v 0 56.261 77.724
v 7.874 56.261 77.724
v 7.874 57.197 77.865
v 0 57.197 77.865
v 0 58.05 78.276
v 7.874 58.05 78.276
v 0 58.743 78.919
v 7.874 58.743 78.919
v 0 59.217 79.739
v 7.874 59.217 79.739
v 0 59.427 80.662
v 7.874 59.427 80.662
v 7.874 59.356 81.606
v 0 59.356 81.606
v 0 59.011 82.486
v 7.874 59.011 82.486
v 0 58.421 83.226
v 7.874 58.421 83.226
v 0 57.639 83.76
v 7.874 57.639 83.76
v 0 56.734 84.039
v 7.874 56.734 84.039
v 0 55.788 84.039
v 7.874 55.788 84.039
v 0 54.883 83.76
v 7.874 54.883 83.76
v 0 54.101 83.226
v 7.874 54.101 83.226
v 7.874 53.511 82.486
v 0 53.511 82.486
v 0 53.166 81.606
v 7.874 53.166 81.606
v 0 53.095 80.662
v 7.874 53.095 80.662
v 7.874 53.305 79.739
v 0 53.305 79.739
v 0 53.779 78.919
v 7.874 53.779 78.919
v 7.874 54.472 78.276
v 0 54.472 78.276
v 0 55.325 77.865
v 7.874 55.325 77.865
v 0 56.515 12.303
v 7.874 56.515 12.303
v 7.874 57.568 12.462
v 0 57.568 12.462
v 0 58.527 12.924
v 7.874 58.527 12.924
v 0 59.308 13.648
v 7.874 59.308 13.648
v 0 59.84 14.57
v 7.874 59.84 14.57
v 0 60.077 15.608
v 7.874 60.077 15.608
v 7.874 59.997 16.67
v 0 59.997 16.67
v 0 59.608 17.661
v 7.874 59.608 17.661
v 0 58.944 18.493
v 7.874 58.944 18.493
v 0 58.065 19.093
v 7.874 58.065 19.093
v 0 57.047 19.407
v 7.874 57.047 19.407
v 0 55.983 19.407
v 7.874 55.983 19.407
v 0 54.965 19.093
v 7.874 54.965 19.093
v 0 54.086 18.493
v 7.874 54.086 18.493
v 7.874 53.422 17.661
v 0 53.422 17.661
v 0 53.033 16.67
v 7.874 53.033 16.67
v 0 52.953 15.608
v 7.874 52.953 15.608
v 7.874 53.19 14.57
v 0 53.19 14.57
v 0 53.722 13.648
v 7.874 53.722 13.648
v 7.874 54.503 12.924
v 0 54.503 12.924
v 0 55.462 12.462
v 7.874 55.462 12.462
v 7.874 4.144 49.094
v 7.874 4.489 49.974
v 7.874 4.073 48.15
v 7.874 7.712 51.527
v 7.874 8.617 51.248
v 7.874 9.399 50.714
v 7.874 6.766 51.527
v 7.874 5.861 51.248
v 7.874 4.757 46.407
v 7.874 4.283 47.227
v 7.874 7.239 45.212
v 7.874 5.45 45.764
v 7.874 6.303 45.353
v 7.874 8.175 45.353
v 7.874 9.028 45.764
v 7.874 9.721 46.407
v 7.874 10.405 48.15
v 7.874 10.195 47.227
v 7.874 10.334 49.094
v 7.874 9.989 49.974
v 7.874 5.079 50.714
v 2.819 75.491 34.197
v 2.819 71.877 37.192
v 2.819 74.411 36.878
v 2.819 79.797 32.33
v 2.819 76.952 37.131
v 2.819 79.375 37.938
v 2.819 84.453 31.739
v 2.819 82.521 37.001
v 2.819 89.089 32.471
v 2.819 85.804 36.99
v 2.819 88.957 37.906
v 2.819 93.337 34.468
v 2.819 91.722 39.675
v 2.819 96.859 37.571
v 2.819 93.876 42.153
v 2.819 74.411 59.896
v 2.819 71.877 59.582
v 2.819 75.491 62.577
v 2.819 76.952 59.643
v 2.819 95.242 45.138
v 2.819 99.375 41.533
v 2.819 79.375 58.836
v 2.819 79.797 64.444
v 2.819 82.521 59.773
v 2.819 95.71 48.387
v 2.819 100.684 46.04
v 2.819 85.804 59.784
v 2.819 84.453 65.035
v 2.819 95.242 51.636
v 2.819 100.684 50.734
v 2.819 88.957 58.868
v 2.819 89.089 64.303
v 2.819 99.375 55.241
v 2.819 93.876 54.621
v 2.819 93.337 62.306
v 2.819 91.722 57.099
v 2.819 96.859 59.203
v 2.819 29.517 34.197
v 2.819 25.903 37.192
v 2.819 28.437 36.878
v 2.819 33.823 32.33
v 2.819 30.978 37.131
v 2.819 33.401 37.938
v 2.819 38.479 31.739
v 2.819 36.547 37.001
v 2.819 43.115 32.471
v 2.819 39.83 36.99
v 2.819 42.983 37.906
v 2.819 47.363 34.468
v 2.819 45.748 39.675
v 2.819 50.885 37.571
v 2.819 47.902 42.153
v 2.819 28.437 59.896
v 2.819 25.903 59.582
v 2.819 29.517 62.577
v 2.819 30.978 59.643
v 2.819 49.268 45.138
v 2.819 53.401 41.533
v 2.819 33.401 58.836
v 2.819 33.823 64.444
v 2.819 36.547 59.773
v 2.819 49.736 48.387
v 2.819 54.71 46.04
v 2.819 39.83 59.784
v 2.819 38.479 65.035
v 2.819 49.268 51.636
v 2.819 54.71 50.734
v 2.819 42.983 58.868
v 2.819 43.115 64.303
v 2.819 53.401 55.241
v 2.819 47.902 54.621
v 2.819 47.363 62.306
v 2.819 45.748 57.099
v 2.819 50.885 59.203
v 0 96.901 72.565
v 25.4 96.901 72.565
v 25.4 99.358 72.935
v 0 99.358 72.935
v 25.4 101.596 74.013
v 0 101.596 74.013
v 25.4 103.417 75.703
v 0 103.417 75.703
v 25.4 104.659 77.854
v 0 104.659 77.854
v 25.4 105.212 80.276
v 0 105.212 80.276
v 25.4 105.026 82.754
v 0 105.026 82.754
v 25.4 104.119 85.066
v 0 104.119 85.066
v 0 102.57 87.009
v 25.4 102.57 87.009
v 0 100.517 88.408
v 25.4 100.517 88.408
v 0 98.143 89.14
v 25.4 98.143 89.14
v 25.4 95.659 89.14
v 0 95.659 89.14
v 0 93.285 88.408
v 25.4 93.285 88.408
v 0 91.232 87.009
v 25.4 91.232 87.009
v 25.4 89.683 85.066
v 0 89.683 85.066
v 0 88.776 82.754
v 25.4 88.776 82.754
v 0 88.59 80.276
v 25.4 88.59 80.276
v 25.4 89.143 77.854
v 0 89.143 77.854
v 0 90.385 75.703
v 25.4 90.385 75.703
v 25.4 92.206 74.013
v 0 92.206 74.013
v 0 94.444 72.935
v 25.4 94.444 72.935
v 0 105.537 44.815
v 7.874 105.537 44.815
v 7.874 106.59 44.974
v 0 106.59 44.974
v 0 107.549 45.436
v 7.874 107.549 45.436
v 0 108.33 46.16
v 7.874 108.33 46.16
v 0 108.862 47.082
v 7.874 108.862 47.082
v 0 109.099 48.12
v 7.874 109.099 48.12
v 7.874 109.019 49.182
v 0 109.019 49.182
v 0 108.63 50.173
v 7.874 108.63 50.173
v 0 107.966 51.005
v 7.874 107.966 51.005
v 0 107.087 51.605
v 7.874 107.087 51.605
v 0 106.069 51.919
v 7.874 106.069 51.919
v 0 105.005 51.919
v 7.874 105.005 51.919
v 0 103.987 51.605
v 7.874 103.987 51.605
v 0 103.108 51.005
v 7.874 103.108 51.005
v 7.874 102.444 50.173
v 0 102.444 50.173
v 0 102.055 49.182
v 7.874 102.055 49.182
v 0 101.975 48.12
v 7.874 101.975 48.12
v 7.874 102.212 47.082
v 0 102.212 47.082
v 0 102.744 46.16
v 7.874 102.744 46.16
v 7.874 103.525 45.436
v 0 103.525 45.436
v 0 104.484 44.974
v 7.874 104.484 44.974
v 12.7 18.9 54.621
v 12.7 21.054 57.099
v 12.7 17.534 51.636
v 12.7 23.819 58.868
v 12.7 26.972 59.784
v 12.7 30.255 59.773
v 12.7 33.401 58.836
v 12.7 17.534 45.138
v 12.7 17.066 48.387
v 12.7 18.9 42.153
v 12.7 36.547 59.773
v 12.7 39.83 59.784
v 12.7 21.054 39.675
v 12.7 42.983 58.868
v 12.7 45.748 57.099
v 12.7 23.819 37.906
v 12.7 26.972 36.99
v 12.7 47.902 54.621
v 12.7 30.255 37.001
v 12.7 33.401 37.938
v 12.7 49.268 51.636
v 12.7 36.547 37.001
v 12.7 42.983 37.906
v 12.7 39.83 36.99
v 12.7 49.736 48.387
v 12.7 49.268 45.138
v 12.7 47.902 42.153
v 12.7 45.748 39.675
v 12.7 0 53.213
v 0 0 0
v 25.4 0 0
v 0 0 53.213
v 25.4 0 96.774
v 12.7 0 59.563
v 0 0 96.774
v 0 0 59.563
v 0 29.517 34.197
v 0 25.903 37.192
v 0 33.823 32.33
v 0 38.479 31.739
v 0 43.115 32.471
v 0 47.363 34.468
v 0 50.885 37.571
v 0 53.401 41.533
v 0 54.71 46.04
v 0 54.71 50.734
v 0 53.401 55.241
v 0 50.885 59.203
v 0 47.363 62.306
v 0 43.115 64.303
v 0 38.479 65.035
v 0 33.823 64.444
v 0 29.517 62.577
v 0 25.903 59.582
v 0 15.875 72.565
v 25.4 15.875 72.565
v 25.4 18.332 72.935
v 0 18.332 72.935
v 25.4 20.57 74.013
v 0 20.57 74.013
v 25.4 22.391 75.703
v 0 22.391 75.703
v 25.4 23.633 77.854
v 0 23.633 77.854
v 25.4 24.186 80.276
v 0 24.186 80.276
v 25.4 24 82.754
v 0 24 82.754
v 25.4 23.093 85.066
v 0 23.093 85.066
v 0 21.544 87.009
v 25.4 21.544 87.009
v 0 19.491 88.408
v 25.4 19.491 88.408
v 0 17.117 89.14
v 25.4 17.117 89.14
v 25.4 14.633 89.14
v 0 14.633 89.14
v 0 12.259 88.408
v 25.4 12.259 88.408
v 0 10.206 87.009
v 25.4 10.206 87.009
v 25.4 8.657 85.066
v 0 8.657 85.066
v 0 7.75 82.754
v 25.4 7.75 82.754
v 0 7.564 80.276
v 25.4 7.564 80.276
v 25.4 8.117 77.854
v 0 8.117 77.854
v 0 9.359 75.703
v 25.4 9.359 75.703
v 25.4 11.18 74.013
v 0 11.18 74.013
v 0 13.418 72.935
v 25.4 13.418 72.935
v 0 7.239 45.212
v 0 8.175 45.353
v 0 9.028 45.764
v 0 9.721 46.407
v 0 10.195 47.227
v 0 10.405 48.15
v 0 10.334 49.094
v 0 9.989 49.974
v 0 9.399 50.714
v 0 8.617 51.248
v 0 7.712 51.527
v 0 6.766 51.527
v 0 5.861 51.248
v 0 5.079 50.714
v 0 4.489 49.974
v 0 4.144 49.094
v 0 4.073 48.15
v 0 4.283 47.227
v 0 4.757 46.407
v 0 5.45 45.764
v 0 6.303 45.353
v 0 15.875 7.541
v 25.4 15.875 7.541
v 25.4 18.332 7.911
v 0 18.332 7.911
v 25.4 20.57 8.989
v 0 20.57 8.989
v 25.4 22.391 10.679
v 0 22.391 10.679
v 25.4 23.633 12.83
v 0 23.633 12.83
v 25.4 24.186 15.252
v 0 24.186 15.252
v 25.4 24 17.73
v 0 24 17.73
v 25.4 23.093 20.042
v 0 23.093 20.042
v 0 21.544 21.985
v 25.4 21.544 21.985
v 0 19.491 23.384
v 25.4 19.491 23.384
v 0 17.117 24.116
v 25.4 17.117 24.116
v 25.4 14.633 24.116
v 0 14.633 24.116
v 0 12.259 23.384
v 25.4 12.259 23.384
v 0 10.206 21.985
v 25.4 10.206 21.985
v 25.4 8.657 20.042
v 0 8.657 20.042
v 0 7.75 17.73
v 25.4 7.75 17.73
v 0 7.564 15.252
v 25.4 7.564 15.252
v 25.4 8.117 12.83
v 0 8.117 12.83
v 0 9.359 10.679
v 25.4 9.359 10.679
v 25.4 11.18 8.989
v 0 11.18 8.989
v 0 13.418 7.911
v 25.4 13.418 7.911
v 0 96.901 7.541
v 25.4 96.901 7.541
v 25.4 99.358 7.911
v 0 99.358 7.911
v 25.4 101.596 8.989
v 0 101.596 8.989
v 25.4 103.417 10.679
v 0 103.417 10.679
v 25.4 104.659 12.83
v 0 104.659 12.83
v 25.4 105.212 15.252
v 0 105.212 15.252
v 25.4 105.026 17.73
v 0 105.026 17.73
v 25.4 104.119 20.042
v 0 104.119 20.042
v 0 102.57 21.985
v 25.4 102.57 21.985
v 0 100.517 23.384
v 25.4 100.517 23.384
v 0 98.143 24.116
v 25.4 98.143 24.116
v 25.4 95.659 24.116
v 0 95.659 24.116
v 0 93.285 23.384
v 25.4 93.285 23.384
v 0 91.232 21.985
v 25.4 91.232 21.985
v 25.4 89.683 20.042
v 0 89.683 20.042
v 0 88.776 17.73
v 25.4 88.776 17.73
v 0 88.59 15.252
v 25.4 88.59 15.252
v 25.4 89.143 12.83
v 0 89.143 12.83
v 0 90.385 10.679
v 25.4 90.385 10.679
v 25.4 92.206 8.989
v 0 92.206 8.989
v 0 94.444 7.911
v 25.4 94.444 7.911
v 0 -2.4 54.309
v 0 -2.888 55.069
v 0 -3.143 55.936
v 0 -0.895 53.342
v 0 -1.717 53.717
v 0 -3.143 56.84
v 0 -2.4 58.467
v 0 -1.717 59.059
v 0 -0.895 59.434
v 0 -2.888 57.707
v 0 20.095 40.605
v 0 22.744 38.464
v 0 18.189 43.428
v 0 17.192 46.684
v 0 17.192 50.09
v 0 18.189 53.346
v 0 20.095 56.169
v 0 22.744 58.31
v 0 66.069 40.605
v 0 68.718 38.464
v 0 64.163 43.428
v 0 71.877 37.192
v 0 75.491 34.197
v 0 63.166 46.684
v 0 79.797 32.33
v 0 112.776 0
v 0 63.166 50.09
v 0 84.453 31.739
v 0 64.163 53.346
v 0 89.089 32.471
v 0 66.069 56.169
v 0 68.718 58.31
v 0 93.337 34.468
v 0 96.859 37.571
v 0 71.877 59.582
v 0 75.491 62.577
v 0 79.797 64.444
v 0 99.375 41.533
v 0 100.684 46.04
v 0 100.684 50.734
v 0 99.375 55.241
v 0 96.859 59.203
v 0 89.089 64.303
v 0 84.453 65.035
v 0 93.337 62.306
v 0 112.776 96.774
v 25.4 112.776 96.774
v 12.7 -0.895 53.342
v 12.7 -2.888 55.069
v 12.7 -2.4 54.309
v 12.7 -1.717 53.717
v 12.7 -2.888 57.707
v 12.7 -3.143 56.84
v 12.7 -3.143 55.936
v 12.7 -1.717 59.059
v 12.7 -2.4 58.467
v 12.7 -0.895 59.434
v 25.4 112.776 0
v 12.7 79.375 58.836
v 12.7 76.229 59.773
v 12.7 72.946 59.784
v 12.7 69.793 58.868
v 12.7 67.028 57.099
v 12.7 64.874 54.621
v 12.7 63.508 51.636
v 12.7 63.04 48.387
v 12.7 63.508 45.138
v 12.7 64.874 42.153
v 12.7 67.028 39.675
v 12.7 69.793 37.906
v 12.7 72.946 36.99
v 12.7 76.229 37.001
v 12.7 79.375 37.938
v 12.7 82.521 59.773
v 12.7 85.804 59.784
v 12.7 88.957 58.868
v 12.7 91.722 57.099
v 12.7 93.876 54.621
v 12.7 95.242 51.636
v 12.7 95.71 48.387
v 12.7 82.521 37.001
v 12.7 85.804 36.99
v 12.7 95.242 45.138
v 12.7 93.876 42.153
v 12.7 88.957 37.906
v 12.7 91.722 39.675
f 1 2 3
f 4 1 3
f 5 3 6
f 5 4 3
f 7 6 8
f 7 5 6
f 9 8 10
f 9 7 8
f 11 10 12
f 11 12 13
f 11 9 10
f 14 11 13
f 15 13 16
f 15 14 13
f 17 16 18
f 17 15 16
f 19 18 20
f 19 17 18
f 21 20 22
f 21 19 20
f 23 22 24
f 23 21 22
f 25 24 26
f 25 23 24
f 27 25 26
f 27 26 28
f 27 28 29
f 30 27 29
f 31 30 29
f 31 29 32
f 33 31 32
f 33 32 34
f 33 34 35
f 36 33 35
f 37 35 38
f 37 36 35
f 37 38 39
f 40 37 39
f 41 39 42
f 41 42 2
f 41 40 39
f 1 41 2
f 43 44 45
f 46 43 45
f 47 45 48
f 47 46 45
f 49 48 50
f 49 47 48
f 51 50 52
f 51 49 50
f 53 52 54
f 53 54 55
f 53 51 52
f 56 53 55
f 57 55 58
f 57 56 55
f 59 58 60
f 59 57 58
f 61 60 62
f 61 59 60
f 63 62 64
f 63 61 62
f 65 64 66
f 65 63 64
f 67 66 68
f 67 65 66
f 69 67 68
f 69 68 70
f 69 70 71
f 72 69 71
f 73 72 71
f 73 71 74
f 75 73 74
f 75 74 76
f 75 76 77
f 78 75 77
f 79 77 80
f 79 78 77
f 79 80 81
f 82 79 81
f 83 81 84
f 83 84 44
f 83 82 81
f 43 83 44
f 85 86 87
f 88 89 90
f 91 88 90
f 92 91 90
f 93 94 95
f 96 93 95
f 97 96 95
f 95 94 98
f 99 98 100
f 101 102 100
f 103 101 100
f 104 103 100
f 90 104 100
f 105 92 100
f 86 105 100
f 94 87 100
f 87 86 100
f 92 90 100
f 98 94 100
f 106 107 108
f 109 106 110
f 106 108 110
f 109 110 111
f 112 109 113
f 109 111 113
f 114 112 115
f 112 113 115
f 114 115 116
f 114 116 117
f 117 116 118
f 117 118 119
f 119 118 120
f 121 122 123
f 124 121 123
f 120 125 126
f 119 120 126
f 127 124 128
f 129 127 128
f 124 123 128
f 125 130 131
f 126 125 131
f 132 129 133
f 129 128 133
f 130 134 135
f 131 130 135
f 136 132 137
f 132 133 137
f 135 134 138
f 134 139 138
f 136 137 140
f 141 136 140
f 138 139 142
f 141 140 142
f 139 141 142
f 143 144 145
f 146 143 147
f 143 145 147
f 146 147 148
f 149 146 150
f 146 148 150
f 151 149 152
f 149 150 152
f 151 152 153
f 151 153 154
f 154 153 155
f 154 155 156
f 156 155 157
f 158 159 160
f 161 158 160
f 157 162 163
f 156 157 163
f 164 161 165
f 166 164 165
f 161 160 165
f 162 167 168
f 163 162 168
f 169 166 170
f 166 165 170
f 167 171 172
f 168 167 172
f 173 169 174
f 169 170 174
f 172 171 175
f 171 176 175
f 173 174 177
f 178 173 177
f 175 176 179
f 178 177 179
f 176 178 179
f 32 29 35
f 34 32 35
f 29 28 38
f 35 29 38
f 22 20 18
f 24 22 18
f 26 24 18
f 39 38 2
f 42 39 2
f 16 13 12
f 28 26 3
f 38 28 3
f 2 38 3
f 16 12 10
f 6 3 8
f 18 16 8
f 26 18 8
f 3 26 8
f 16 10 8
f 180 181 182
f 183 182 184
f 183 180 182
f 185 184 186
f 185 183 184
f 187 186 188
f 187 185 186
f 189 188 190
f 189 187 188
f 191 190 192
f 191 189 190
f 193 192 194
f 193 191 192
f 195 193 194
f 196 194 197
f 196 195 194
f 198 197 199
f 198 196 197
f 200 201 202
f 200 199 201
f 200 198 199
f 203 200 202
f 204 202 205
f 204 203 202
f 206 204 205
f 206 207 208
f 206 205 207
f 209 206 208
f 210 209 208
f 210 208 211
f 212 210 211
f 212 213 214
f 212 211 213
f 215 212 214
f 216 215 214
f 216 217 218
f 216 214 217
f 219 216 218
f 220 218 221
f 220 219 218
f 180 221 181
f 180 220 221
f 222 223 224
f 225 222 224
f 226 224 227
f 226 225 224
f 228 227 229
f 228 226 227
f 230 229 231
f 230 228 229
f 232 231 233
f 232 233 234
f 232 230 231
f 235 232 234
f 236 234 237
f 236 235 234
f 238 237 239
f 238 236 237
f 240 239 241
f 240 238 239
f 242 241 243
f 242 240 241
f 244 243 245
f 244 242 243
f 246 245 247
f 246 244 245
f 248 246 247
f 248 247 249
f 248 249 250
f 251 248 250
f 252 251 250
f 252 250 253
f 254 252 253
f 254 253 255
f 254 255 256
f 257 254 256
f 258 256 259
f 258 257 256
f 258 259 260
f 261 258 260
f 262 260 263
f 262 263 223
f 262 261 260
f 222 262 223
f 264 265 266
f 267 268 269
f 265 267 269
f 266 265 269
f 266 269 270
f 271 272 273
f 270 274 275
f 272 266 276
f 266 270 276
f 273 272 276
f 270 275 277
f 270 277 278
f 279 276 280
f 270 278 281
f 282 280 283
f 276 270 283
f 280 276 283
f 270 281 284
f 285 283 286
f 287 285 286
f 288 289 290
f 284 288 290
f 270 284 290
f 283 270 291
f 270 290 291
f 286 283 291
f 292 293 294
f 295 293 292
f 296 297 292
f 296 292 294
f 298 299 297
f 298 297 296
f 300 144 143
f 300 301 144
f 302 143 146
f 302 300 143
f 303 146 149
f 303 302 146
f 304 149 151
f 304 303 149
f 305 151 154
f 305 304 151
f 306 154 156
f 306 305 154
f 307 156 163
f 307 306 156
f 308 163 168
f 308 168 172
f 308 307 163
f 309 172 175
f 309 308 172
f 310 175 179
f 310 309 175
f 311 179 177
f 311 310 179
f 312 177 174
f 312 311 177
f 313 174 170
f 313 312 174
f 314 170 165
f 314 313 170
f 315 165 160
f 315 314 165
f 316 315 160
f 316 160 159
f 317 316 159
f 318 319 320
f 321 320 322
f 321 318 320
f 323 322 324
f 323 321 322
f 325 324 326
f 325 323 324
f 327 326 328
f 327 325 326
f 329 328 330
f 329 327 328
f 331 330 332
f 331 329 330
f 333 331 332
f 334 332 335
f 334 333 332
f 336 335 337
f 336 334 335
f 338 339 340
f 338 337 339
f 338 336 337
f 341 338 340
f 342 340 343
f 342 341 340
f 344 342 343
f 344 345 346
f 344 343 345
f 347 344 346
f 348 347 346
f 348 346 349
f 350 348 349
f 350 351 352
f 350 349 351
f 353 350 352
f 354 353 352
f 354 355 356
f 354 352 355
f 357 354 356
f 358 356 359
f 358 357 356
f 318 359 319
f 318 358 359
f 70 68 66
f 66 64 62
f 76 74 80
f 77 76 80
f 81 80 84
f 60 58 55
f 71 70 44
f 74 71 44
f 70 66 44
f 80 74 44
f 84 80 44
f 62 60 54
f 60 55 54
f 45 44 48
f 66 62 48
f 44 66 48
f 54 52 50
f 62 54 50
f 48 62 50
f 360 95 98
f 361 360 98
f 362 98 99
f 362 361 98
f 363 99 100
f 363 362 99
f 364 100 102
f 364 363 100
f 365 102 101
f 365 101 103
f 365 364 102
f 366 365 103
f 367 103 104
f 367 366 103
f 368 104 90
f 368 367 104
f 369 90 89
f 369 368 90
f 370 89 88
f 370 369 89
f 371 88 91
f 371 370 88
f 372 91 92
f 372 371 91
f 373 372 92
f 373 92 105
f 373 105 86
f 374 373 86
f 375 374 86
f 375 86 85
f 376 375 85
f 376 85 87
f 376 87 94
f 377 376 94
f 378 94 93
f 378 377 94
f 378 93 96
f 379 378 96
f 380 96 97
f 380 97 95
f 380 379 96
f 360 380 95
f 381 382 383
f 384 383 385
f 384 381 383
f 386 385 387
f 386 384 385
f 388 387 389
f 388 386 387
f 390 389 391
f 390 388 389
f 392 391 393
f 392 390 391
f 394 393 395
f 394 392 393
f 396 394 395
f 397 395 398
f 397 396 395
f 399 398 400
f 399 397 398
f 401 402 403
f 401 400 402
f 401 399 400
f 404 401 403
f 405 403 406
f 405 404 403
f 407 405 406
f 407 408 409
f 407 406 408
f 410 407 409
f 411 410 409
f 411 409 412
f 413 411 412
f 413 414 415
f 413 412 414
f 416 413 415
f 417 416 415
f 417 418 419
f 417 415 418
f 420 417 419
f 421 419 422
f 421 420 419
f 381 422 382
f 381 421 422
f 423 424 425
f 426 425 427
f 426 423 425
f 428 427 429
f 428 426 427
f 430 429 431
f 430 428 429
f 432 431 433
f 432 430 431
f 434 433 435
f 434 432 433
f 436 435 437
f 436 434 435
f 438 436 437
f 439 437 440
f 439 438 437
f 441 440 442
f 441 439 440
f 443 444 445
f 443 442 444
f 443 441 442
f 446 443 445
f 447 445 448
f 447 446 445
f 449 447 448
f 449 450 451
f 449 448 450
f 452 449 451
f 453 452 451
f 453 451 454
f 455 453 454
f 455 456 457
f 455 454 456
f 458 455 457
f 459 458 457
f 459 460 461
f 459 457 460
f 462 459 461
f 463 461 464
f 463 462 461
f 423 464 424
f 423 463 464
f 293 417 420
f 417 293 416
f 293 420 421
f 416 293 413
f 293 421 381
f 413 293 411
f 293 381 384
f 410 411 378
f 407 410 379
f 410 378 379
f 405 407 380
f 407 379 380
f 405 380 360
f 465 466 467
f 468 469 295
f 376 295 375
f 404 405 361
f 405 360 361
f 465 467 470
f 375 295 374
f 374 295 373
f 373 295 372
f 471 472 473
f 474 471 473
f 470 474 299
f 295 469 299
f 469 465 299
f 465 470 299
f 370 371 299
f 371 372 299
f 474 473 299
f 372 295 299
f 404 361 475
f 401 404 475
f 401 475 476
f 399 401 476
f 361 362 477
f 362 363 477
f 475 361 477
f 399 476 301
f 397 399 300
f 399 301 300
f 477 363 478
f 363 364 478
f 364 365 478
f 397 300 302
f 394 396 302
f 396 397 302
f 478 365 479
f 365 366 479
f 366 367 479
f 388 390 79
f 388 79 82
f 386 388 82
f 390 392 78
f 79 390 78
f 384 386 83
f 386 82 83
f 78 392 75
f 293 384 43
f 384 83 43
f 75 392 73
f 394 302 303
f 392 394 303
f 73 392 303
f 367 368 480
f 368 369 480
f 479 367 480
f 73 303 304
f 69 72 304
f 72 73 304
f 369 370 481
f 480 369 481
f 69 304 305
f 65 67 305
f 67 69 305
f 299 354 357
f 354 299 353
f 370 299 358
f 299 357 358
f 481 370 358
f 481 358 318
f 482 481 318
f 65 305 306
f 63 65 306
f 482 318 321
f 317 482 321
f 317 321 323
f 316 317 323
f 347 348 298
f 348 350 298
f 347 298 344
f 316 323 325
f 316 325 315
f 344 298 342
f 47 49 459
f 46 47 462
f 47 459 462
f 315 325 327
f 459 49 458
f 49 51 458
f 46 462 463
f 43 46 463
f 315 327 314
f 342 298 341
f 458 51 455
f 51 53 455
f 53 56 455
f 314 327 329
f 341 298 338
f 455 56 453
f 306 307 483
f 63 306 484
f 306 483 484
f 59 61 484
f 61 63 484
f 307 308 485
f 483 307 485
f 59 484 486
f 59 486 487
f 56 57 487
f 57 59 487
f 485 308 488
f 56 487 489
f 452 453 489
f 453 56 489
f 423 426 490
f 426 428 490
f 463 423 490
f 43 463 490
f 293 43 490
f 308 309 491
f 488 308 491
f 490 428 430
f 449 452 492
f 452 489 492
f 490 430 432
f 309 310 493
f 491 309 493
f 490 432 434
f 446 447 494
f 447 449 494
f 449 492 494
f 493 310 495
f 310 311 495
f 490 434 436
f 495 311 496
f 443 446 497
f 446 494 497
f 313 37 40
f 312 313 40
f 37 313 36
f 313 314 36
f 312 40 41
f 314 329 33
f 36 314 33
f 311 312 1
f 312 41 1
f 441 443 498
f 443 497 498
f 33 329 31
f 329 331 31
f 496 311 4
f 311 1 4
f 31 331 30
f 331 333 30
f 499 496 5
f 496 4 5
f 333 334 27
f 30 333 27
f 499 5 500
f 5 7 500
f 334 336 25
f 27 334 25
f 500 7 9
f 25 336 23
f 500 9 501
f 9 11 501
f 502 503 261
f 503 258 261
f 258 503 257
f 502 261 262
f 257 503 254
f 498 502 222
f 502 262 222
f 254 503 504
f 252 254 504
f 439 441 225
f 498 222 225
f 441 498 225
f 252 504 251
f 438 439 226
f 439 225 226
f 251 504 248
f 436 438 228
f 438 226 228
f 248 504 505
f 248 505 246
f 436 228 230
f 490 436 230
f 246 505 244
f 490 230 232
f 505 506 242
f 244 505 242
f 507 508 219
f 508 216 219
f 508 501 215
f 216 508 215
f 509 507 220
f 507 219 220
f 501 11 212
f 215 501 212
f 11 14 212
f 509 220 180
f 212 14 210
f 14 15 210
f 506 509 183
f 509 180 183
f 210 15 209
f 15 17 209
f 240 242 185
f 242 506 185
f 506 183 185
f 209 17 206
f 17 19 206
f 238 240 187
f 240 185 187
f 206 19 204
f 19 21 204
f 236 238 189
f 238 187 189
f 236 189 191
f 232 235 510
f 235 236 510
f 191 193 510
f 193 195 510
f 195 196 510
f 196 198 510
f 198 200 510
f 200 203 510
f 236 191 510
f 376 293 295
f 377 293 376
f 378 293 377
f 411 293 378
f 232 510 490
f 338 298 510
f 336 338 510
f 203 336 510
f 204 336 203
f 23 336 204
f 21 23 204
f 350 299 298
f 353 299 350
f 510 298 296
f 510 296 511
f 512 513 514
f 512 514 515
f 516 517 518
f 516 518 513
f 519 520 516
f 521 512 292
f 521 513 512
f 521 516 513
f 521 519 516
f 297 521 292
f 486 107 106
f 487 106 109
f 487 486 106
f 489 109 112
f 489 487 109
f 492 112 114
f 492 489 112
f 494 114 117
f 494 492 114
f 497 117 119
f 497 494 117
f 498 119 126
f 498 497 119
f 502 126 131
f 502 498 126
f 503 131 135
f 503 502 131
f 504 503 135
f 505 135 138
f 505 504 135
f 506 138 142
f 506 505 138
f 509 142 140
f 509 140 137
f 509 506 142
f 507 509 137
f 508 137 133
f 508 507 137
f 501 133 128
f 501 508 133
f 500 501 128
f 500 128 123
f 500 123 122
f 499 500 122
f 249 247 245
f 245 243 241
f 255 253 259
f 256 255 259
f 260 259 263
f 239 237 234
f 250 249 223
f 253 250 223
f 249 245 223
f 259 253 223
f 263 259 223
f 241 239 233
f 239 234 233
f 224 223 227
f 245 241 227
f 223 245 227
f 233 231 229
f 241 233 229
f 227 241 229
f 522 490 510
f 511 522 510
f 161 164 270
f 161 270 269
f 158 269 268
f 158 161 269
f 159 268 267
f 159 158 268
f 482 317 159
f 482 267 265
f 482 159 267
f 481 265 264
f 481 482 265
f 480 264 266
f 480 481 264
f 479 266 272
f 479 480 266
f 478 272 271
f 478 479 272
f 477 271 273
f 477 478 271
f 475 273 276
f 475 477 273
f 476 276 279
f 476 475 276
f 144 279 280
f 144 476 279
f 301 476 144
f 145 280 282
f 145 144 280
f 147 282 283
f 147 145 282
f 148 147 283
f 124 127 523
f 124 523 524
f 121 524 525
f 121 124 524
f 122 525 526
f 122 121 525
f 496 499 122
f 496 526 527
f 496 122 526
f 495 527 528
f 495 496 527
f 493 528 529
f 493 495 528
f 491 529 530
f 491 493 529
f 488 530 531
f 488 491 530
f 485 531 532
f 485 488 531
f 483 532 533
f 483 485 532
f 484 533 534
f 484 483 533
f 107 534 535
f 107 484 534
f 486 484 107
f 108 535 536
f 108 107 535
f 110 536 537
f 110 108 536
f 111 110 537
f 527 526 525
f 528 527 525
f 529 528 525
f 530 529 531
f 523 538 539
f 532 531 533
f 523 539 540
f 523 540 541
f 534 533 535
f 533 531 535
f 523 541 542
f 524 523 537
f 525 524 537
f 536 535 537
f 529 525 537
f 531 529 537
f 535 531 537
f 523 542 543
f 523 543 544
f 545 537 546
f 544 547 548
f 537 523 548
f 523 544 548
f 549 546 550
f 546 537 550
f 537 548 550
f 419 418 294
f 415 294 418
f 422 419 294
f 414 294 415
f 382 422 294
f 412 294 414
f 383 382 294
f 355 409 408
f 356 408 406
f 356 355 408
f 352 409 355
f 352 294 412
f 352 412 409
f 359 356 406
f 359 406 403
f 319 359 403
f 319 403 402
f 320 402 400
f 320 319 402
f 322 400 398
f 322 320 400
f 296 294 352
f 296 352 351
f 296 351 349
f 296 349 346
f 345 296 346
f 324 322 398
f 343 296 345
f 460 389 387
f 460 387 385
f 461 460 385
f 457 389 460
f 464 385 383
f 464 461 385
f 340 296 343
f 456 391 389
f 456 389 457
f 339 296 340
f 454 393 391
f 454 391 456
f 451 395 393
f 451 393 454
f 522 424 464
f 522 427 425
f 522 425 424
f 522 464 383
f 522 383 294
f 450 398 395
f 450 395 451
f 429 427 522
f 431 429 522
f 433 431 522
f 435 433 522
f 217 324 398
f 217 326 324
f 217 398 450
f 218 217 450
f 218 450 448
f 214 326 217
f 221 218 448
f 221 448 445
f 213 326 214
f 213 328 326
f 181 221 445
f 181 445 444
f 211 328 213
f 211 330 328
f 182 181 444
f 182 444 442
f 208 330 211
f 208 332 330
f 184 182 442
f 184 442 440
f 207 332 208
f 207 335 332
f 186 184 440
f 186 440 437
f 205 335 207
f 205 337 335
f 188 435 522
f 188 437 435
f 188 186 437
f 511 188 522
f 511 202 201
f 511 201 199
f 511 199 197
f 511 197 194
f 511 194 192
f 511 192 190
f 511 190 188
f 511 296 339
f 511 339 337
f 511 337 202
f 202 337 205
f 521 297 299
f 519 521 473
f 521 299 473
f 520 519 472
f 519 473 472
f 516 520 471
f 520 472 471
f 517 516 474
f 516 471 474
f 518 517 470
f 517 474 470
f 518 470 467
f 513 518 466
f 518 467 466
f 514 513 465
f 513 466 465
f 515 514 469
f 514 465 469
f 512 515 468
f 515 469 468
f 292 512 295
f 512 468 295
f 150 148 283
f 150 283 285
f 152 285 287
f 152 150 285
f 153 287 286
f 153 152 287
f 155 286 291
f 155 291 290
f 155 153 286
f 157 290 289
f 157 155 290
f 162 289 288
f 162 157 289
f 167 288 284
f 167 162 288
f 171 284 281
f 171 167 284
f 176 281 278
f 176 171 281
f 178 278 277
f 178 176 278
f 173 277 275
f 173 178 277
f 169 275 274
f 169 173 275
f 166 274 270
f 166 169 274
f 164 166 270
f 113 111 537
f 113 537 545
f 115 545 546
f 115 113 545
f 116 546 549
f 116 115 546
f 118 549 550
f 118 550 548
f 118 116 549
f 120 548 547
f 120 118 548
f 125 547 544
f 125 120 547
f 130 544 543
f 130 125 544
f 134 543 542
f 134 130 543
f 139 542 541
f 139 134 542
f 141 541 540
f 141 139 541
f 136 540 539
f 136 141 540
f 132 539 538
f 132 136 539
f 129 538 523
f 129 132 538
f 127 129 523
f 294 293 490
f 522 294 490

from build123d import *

# Parameters (mm, degrees)
SKETCH1_W           = 112.776
SKETCH1_H           = 96.774
BOSS_EXTRUDE1_DEPTH = 25.4
SKETCH2_R           = 8.334375
CUT_EXTRUDE2_DEPTH  = 151.760715215
SKETCH3_R           = 11.509375
CUT_EXTRUDE3_DEPTH  = 12.7
SKETCH4_R           = 11.509375
CUT_EXTRUDE4_DEPTH  = 12.7
SKETCH5_R           = 16.6497
CUT_EXTRUDE5_DEPTH  = 2.8194
SKETCH6_R           = 3.571875
CUT_EXTRUDE6_DEPTH  = 7.874
SKETCH8_R           = 3.175
CUT_EXTRUDE9_DEPTH  = 7.874
SKETCH9_R           = 3.175
BOSS_EXTRUDE2_DEPTH = 12.7


with BuildPart() as part:
    # Sketch1 → Boss-Extrude1 (new body)
    with BuildSketch(Plane.YZ):
        with Locations((56.388, 48.387)):
            Rectangle(SKETCH1_W, SKETCH1_H)
    extrude(amount=BOSS_EXTRUDE1_DEPTH)

    # Sketch2 → Cut-Extrude2 (cut, through all)
    with BuildSketch(Plane.YZ):
        with Locations(Location((15.875, 15.875, 0), (0, 0, 270))):
            Circle(SKETCH2_R)
        with Locations(Location((96.901, 15.875, 0), (0, 0, 270))):
            Circle(SKETCH2_R)
        with Locations(Location((15.875, 80.899, 0), (0, 0, 270))):
            Circle(SKETCH2_R)
        with Locations(Location((96.901, 80.899, 0), (0, 0, 270))):
            Circle(SKETCH2_R)
    extrude(amount=CUT_EXTRUDE2_DEPTH, mode=Mode.SUBTRACT)

    # Sketch3 → Cut-Extrude3 (cut)
    with BuildSketch(Plane.YZ):
        with Locations(Location((28.575, 48.387, 0), (0, 0, 270))):
            Circle(SKETCH3_R)
        with Locations(Location((74.549, 48.387, 0), (0, 0, 270))):
            Circle(SKETCH3_R)
    extrude(amount=CUT_EXTRUDE3_DEPTH, mode=Mode.SUBTRACT)

    # Sketch4 → Cut-Extrude4 (cut)
    with BuildSketch(Plane.YZ):
        with Locations((38.227, 48.387)):
            Circle(SKETCH4_R)
        with Locations((84.201, 48.387)):
            Circle(SKETCH4_R)
    extrude(amount=CUT_EXTRUDE4_DEPTH, mode=Mode.SUBTRACT)

    # Sketch5 → Cut-Extrude5 (cut)
    with BuildSketch(Plane.YZ):
        with Locations((38.227, 48.387)):
            Circle(SKETCH5_R)
        with Locations((84.201, 48.387)):
            Circle(SKETCH5_R)
    extrude(amount=CUT_EXTRUDE5_DEPTH, mode=Mode.SUBTRACT)

    # Sketch6 → Cut-Extrude6 (cut)
    with BuildSketch(Plane.YZ):
        with Locations(Location((105.537, 48.387, 0), (0, 0, 270))):
            Circle(SKETCH6_R)
        with Locations(Location((56.515, 15.875, 0), (0, 0, 270))):
            Circle(SKETCH6_R)
    extrude(amount=CUT_EXTRUDE6_DEPTH, mode=Mode.SUBTRACT)

    # Sketch8 → Cut-Extrude9 (cut)
    with BuildSketch(Plane.YZ):
        with Locations(Location((7.239, 48.387, 0), (0, 0, 270))):
            Circle(SKETCH8_R)
        with Locations(Location((56.261, 80.899, 0), (0, 0, 270))):
            Circle(SKETCH8_R)
    extrude(amount=CUT_EXTRUDE9_DEPTH, mode=Mode.SUBTRACT)

    # Sketch9 → Boss-Extrude2 (add)
    with BuildSketch(Plane.YZ):
        with Locations((0, 56.388)):
            Circle(SKETCH9_R)
    extrude(amount=BOSS_EXTRUDE2_DEPTH)


solid = part.part
